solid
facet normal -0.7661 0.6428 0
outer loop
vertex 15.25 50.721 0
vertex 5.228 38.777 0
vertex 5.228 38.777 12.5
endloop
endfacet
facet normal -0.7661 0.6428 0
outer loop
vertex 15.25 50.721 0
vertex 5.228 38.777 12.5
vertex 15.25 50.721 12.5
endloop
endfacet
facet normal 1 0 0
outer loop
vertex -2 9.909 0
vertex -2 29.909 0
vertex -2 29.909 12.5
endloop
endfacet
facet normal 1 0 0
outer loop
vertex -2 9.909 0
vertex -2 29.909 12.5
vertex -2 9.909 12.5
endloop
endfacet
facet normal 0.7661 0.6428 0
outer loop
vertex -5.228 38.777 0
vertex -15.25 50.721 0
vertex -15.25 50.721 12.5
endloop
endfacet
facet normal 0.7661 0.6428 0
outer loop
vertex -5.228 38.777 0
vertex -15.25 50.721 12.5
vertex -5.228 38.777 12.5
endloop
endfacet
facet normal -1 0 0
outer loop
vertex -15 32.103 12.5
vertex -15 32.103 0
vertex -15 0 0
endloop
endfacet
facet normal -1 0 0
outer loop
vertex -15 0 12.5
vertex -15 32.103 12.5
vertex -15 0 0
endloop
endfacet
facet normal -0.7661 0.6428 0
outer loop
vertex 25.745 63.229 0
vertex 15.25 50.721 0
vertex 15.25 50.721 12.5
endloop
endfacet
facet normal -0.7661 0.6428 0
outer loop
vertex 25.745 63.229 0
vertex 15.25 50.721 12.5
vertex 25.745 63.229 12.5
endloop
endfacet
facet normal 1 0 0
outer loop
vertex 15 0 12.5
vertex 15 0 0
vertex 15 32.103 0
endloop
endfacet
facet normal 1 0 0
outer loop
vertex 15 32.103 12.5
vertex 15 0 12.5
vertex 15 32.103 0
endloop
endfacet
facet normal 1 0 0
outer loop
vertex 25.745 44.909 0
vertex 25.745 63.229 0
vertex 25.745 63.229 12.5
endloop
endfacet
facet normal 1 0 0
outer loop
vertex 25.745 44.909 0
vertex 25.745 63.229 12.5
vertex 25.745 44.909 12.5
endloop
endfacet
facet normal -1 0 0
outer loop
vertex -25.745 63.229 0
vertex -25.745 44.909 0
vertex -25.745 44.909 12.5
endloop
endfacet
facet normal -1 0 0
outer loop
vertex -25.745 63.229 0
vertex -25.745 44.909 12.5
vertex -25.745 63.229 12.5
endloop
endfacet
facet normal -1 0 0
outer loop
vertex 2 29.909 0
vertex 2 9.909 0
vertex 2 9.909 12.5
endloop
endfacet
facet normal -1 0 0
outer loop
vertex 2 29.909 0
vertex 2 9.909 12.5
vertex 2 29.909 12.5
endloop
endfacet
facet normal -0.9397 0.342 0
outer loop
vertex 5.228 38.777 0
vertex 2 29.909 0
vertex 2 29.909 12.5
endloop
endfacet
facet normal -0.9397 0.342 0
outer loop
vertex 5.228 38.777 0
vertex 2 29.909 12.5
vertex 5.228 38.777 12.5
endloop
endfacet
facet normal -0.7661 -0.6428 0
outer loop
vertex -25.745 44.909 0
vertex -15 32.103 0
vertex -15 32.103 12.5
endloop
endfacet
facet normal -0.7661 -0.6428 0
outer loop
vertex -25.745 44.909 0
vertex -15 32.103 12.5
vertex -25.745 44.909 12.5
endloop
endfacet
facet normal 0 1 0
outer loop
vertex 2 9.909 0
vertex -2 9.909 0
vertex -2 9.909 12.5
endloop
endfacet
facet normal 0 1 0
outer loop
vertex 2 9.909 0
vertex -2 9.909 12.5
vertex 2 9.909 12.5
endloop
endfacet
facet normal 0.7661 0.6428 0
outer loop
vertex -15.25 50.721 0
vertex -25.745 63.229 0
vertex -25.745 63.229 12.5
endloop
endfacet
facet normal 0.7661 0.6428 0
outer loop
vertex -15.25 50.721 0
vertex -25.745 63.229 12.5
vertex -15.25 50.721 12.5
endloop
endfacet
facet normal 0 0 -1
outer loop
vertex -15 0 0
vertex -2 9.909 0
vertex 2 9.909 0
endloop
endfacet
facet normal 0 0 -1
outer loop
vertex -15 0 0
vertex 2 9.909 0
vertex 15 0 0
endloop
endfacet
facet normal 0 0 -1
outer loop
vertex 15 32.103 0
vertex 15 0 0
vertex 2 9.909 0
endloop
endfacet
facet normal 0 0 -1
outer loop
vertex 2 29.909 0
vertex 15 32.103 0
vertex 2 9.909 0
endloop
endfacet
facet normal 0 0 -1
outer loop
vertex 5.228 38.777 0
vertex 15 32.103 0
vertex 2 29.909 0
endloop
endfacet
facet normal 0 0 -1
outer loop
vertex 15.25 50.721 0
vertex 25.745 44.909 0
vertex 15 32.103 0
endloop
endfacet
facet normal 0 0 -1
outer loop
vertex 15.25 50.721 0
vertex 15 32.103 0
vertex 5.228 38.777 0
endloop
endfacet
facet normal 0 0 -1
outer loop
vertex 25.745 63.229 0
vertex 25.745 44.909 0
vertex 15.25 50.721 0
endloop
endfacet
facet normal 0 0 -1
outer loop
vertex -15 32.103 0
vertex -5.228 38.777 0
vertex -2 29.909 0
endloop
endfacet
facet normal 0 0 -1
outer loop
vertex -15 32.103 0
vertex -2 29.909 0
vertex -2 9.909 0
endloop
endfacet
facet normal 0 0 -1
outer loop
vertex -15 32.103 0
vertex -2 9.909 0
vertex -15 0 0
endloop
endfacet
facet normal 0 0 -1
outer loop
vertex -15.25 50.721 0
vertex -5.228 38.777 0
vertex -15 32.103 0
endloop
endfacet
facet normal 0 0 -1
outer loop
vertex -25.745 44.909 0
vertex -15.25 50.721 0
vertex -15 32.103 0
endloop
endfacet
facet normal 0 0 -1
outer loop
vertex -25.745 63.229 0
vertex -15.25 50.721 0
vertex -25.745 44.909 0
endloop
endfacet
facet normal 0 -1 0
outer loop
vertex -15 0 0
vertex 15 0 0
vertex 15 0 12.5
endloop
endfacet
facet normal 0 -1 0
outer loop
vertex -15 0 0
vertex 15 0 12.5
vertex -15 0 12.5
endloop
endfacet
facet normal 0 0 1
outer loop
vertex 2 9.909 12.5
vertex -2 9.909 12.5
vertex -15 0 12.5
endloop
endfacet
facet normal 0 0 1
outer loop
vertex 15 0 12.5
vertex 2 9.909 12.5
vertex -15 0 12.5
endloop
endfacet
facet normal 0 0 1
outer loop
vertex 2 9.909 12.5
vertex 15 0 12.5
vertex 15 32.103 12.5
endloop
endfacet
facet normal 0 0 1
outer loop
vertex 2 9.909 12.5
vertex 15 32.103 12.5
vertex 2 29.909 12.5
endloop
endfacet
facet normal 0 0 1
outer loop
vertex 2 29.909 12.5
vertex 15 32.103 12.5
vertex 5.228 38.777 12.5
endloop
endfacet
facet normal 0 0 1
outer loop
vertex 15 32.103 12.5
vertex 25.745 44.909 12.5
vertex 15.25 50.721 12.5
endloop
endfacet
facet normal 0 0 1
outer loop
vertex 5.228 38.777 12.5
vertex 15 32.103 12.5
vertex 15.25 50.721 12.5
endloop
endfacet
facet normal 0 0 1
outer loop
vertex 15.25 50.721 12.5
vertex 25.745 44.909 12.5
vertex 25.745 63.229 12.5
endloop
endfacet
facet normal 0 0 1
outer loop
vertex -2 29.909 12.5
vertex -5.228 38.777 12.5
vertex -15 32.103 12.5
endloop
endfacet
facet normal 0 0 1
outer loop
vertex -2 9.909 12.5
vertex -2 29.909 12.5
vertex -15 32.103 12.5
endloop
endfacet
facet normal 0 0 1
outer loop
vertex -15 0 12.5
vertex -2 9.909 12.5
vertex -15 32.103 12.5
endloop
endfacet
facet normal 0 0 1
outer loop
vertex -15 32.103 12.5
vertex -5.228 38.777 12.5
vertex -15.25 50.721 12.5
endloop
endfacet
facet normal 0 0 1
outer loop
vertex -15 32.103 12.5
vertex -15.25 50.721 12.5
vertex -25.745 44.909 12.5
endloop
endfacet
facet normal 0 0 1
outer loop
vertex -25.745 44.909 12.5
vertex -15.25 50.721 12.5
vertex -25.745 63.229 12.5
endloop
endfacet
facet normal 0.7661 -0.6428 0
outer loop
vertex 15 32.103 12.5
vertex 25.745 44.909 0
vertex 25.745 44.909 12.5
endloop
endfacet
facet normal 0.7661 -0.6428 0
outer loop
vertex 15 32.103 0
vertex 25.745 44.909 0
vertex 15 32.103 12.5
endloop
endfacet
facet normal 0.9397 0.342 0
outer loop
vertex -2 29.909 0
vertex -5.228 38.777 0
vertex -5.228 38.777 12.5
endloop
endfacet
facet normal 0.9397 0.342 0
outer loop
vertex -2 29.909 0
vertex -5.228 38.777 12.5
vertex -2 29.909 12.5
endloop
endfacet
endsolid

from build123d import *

# Parameters (mm, degrees)
BOSS_EXTRUDE1_DEPTH = 12.5


with BuildPart() as part:
    # Sketch4 → Boss-Extrude1 (new body)
    with BuildSketch(Plane.XY):
        Polygon((15, 32.102616066), (15, 29.909064249), (2, 29.909064249), (5.227521969, 38.776607979), (15.250051757, 50.72099386), (25.745438879, 63.228909169), (25.745438879, 44.908531455), align=None)
        Polygon((-2, 29.909064249), (-15, 29.909064249), (-15, 32.102616066), (-25.745438879, 44.908531455), (-25.745438879, 63.228909169), (-15.250051757, 50.72099386), (-5.227521969, 38.776607979), align=None)
        Polygon((-2, 29.909064249), (-2, 9.909064249), (2, 9.909064249), (2, 29.909064249), (15, 29.909064249), (15, 0), (-15, 0), (-15, 29.909064249), align=None)
    extrude(amount=BOSS_EXTRUDE1_DEPTH)


solid = part.part
